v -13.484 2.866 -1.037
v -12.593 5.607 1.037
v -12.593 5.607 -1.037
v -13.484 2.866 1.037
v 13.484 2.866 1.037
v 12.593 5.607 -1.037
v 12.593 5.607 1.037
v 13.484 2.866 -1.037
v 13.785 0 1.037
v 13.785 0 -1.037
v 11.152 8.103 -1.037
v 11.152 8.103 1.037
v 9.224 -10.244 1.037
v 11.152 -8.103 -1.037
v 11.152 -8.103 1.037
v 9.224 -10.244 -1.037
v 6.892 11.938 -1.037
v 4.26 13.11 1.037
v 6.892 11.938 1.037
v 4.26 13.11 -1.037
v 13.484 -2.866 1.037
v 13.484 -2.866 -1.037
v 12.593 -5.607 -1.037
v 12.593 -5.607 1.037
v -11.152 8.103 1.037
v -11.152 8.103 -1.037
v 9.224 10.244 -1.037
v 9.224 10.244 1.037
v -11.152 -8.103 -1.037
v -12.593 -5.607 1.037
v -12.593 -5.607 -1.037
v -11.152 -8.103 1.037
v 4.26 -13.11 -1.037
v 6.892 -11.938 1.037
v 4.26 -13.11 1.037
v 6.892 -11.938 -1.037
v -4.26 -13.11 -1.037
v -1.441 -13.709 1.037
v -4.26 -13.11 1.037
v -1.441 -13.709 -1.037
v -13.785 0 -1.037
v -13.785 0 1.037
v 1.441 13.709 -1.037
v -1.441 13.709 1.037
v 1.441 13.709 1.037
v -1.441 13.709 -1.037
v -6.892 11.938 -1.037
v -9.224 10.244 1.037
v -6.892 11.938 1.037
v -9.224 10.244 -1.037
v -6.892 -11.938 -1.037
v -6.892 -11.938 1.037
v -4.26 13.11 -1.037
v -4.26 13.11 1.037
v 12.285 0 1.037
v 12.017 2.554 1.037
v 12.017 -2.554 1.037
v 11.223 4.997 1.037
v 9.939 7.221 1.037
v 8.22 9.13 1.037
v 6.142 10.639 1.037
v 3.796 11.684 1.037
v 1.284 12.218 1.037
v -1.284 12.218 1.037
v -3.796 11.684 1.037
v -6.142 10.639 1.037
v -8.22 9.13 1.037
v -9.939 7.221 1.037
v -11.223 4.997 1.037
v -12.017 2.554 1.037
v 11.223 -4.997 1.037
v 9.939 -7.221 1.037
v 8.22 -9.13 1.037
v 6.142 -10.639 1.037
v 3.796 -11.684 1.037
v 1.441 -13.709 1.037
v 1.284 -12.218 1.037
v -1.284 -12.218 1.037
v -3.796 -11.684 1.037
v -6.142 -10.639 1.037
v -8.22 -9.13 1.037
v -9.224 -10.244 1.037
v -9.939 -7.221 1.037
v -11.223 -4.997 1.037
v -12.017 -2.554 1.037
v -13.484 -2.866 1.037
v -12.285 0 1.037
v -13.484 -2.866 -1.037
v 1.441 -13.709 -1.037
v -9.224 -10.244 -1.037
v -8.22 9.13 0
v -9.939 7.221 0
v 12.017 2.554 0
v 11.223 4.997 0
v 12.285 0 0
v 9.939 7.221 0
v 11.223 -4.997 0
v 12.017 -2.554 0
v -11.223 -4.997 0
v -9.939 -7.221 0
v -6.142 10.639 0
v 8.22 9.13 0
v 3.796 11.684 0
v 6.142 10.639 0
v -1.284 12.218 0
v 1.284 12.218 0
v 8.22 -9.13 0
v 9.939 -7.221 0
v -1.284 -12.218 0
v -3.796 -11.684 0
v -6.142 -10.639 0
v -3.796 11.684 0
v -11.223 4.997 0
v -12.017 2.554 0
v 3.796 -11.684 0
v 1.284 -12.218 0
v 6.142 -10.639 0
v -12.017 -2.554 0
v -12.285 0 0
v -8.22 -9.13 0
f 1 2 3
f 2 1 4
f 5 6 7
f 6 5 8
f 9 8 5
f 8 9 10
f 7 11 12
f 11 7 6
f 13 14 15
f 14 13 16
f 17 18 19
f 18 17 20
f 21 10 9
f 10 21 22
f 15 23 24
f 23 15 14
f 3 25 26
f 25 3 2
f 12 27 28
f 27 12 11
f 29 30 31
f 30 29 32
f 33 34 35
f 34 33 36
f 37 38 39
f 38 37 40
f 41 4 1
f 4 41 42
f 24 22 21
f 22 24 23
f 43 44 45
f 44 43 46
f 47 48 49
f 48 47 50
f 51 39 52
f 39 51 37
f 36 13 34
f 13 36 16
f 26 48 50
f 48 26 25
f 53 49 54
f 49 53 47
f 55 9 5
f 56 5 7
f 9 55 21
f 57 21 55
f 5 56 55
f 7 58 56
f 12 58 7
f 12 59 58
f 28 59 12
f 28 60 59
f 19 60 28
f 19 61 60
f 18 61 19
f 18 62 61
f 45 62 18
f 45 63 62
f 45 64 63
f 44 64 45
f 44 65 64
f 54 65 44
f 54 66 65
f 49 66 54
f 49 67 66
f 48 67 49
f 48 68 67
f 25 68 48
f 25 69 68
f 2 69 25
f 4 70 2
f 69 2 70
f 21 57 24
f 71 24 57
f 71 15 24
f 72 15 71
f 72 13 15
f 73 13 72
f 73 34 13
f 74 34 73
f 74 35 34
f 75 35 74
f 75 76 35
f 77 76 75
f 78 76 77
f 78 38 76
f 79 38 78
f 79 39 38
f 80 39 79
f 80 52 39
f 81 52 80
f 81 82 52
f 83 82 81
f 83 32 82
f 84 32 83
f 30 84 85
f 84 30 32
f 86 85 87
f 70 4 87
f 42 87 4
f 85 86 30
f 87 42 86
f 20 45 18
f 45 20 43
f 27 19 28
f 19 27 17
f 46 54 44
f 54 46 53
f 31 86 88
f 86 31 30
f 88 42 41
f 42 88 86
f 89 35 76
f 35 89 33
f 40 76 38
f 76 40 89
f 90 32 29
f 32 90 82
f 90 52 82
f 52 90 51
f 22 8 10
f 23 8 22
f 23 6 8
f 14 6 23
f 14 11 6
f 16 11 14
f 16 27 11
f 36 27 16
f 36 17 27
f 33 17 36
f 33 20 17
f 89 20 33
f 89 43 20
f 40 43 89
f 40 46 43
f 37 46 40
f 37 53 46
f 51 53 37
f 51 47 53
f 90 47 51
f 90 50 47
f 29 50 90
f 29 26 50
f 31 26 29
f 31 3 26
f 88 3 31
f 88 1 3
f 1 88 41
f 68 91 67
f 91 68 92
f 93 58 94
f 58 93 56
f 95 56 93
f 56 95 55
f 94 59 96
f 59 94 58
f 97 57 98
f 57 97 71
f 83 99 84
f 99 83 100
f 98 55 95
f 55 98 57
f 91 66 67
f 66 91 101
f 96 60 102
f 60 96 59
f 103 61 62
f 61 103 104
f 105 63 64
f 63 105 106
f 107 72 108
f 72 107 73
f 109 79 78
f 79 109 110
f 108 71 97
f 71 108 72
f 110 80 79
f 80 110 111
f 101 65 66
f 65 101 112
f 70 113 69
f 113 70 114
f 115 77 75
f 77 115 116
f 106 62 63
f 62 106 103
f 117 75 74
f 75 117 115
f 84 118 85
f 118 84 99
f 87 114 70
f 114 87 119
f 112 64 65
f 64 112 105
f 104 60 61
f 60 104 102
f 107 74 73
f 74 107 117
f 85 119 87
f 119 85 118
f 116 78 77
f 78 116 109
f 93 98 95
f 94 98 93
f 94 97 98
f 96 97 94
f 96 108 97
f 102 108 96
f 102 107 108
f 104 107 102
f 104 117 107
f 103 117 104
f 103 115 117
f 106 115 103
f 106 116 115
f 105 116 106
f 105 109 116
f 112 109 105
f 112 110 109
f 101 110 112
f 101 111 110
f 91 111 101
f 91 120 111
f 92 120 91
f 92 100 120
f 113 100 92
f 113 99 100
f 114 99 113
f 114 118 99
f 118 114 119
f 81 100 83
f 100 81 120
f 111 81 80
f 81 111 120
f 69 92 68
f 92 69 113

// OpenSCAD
FUDGE = 0.35;
COIN_HEIGHT = FUDGE + 1.8;
COIN_DIAMETER = FUDGE + 24.22;
WRAPPER_DIAMETER = COIN_DIAMETER+3;
WRAPPER_HEIGHT = 1+(COIN_HEIGHT/2);

module coin() {
    cylinder(h=COIN_HEIGHT, d=COIN_DIAMETER, center=true);
}

module wrapper() {
    cylinder(h=WRAPPER_HEIGHT, d=WRAPPER_DIAMETER, center=true);
}

difference() {
    color("blue") wrapper();
    translate([0,0,COIN_HEIGHT/2]) coin();
}
